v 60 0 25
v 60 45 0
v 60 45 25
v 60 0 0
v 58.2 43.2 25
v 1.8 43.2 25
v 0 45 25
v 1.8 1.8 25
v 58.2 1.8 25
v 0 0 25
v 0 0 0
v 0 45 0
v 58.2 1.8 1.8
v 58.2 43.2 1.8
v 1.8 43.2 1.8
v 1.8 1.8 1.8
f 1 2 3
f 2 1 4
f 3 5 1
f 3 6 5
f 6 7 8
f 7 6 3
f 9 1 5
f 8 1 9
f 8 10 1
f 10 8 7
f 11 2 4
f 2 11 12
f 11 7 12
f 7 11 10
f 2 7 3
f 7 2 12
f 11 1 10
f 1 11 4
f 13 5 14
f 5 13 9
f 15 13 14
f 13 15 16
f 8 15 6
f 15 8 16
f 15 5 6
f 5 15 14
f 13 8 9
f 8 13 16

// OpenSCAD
// Open-top rectangular tray
outer_w = 60;
outer_l = 45;
outer_h = 25;
wall = 1.8;

difference() {
  cube([outer_w, outer_l, outer_h]);
  translate([wall, wall, wall])
    cube([outer_w - 2 * wall, outer_l - 2 * wall, outer_h - wall + 0.1]);
}
